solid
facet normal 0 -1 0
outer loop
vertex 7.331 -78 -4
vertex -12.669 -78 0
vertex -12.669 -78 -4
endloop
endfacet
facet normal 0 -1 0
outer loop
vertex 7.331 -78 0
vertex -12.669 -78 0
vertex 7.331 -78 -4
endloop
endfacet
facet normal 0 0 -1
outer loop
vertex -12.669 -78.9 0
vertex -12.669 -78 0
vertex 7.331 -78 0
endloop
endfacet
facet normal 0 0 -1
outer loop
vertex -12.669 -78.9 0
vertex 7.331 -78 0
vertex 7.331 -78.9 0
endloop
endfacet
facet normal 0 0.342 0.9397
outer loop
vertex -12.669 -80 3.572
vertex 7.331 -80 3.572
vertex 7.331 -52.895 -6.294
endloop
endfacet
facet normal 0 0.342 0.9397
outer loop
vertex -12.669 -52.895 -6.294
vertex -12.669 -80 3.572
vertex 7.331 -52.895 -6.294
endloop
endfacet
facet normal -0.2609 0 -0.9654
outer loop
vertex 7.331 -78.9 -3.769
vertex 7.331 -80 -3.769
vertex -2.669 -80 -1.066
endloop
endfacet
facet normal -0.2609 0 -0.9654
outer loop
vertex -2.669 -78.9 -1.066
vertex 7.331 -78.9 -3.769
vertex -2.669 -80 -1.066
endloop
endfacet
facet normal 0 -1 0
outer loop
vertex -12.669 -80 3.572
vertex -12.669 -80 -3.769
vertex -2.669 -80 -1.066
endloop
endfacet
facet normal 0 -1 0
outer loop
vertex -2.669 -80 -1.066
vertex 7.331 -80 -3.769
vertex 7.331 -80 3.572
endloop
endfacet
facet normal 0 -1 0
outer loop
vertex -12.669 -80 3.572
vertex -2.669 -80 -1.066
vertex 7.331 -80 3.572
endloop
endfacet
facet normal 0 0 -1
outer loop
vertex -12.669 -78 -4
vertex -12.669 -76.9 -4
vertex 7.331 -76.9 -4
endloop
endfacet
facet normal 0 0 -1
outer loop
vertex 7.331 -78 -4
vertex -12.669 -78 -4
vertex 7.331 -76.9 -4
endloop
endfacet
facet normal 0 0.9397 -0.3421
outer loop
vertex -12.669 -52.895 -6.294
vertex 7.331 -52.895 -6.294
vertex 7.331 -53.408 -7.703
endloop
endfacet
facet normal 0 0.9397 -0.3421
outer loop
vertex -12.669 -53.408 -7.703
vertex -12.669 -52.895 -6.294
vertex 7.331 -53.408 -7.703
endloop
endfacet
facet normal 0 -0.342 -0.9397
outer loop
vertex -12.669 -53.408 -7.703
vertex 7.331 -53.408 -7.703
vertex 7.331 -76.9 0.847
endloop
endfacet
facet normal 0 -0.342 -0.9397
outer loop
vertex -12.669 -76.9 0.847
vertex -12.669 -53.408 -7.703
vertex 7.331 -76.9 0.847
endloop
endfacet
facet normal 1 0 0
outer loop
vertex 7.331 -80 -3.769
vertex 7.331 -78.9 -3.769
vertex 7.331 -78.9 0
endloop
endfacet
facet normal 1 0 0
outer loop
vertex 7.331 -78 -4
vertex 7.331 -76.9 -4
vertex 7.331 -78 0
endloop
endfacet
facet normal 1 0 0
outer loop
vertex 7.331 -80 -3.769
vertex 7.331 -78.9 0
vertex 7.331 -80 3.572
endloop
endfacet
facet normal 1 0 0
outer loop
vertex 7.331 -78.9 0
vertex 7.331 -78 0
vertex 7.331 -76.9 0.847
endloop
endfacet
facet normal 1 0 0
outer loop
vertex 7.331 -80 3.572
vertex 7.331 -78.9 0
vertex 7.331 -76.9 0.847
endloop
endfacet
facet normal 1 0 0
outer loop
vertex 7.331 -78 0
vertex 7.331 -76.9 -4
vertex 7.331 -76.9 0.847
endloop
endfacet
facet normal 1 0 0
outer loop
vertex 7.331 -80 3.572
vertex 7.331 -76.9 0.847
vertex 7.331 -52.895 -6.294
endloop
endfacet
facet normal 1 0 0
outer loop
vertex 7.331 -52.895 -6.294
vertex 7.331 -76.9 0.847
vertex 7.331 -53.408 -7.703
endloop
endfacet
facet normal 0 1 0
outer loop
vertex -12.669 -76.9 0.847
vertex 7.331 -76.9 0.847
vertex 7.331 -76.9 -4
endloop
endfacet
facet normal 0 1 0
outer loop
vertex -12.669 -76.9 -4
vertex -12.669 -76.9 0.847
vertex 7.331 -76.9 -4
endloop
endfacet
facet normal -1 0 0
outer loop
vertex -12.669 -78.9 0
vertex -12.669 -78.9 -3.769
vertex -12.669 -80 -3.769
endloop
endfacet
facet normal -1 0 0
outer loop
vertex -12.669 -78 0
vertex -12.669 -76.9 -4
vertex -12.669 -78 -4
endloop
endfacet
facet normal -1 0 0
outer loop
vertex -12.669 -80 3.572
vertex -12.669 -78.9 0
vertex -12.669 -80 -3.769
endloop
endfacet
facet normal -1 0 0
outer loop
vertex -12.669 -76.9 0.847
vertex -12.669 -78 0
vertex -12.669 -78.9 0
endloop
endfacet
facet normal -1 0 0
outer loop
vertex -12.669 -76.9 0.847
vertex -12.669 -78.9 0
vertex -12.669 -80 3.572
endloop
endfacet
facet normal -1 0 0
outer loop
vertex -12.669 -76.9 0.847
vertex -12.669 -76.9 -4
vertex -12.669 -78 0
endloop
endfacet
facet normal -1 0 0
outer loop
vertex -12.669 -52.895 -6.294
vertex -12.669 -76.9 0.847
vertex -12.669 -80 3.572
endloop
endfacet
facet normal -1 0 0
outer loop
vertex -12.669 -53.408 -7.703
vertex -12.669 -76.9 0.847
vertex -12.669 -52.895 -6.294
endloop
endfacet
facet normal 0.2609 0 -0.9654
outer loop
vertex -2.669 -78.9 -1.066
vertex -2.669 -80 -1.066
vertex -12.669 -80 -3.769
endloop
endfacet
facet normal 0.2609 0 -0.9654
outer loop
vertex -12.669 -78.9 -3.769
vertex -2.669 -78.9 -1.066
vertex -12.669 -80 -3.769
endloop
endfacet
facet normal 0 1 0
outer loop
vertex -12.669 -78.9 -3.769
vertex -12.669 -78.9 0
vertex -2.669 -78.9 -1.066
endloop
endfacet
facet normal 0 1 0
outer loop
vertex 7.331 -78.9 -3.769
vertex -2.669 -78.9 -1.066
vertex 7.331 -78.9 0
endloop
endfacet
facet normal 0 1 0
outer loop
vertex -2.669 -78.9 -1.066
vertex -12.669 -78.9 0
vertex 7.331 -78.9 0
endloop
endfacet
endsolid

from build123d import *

# Parameters (mm, degrees)
CROQUIS1_W                = 20
CROQUIS1_H                = 1.1
SALIENTE_EXTRUIR1_DEPTH   = 4
SALIENTE_EXTRUIR1_2_DEPTH = 4
CORTAR_EXTRUIR1_DEPTH     = 1.1
SALIENTE_EXTRUIR2_DEPTH   = 20


with BuildPart() as part:
    # Croquis1 → Saliente-Extruir1 (new body)
    with BuildSketch(Plane.XY):
        with Locations((-2.668808514, -79.450421588)):
            Rectangle(CROQUIS1_W, CROQUIS1_H)
    extrude(amount=-SALIENTE_EXTRUIR1_DEPTH)

    # Croquis2 → Cortar-Extruir1 (cut)
    with BuildSketch(Plane.XZ.offset(80.000421588)):
        Polygon((8.185712697, -4), (-2.668808514, -1.066345619), (-13.523329725, -4), align=None)
    extrude(amount=-CORTAR_EXTRUIR1_DEPTH, mode=Mode.SUBTRACT)



with BuildPart() as body_2:
    # Croquis1 → Saliente-Extruir1 2 (new body)
    with BuildSketch(Plane.XY):
        with Locations((-2.668808514, -77.450421588)):
            Rectangle(CROQUIS1_W, CROQUIS1_H)
    extrude(amount=-SALIENTE_EXTRUIR1_2_DEPTH)


with BuildPart() as part_1:
    add(part.part)

    add(body_2.part)  # Saliente-Extruir2 merges body 2
    # Croquis3 → Saliente-Extruir2 (add, through all)
    with BuildSketch(Plane(origin=(7.331191486, 0, 0), x_dir=(0, 0, -1), z_dir=(1, 0, 0))):
        Polygon((0, -76.900421588), (0, -80.000421588), (-3.57176217, -80.000421588), (6.293776867, -52.895075854), (7.703315798, -53.408106069), (-0.847187785, -76.900421588), align=None)
    extrude(amount=-SALIENTE_EXTRUIR2_DEPTH)


solid = part_1.part
